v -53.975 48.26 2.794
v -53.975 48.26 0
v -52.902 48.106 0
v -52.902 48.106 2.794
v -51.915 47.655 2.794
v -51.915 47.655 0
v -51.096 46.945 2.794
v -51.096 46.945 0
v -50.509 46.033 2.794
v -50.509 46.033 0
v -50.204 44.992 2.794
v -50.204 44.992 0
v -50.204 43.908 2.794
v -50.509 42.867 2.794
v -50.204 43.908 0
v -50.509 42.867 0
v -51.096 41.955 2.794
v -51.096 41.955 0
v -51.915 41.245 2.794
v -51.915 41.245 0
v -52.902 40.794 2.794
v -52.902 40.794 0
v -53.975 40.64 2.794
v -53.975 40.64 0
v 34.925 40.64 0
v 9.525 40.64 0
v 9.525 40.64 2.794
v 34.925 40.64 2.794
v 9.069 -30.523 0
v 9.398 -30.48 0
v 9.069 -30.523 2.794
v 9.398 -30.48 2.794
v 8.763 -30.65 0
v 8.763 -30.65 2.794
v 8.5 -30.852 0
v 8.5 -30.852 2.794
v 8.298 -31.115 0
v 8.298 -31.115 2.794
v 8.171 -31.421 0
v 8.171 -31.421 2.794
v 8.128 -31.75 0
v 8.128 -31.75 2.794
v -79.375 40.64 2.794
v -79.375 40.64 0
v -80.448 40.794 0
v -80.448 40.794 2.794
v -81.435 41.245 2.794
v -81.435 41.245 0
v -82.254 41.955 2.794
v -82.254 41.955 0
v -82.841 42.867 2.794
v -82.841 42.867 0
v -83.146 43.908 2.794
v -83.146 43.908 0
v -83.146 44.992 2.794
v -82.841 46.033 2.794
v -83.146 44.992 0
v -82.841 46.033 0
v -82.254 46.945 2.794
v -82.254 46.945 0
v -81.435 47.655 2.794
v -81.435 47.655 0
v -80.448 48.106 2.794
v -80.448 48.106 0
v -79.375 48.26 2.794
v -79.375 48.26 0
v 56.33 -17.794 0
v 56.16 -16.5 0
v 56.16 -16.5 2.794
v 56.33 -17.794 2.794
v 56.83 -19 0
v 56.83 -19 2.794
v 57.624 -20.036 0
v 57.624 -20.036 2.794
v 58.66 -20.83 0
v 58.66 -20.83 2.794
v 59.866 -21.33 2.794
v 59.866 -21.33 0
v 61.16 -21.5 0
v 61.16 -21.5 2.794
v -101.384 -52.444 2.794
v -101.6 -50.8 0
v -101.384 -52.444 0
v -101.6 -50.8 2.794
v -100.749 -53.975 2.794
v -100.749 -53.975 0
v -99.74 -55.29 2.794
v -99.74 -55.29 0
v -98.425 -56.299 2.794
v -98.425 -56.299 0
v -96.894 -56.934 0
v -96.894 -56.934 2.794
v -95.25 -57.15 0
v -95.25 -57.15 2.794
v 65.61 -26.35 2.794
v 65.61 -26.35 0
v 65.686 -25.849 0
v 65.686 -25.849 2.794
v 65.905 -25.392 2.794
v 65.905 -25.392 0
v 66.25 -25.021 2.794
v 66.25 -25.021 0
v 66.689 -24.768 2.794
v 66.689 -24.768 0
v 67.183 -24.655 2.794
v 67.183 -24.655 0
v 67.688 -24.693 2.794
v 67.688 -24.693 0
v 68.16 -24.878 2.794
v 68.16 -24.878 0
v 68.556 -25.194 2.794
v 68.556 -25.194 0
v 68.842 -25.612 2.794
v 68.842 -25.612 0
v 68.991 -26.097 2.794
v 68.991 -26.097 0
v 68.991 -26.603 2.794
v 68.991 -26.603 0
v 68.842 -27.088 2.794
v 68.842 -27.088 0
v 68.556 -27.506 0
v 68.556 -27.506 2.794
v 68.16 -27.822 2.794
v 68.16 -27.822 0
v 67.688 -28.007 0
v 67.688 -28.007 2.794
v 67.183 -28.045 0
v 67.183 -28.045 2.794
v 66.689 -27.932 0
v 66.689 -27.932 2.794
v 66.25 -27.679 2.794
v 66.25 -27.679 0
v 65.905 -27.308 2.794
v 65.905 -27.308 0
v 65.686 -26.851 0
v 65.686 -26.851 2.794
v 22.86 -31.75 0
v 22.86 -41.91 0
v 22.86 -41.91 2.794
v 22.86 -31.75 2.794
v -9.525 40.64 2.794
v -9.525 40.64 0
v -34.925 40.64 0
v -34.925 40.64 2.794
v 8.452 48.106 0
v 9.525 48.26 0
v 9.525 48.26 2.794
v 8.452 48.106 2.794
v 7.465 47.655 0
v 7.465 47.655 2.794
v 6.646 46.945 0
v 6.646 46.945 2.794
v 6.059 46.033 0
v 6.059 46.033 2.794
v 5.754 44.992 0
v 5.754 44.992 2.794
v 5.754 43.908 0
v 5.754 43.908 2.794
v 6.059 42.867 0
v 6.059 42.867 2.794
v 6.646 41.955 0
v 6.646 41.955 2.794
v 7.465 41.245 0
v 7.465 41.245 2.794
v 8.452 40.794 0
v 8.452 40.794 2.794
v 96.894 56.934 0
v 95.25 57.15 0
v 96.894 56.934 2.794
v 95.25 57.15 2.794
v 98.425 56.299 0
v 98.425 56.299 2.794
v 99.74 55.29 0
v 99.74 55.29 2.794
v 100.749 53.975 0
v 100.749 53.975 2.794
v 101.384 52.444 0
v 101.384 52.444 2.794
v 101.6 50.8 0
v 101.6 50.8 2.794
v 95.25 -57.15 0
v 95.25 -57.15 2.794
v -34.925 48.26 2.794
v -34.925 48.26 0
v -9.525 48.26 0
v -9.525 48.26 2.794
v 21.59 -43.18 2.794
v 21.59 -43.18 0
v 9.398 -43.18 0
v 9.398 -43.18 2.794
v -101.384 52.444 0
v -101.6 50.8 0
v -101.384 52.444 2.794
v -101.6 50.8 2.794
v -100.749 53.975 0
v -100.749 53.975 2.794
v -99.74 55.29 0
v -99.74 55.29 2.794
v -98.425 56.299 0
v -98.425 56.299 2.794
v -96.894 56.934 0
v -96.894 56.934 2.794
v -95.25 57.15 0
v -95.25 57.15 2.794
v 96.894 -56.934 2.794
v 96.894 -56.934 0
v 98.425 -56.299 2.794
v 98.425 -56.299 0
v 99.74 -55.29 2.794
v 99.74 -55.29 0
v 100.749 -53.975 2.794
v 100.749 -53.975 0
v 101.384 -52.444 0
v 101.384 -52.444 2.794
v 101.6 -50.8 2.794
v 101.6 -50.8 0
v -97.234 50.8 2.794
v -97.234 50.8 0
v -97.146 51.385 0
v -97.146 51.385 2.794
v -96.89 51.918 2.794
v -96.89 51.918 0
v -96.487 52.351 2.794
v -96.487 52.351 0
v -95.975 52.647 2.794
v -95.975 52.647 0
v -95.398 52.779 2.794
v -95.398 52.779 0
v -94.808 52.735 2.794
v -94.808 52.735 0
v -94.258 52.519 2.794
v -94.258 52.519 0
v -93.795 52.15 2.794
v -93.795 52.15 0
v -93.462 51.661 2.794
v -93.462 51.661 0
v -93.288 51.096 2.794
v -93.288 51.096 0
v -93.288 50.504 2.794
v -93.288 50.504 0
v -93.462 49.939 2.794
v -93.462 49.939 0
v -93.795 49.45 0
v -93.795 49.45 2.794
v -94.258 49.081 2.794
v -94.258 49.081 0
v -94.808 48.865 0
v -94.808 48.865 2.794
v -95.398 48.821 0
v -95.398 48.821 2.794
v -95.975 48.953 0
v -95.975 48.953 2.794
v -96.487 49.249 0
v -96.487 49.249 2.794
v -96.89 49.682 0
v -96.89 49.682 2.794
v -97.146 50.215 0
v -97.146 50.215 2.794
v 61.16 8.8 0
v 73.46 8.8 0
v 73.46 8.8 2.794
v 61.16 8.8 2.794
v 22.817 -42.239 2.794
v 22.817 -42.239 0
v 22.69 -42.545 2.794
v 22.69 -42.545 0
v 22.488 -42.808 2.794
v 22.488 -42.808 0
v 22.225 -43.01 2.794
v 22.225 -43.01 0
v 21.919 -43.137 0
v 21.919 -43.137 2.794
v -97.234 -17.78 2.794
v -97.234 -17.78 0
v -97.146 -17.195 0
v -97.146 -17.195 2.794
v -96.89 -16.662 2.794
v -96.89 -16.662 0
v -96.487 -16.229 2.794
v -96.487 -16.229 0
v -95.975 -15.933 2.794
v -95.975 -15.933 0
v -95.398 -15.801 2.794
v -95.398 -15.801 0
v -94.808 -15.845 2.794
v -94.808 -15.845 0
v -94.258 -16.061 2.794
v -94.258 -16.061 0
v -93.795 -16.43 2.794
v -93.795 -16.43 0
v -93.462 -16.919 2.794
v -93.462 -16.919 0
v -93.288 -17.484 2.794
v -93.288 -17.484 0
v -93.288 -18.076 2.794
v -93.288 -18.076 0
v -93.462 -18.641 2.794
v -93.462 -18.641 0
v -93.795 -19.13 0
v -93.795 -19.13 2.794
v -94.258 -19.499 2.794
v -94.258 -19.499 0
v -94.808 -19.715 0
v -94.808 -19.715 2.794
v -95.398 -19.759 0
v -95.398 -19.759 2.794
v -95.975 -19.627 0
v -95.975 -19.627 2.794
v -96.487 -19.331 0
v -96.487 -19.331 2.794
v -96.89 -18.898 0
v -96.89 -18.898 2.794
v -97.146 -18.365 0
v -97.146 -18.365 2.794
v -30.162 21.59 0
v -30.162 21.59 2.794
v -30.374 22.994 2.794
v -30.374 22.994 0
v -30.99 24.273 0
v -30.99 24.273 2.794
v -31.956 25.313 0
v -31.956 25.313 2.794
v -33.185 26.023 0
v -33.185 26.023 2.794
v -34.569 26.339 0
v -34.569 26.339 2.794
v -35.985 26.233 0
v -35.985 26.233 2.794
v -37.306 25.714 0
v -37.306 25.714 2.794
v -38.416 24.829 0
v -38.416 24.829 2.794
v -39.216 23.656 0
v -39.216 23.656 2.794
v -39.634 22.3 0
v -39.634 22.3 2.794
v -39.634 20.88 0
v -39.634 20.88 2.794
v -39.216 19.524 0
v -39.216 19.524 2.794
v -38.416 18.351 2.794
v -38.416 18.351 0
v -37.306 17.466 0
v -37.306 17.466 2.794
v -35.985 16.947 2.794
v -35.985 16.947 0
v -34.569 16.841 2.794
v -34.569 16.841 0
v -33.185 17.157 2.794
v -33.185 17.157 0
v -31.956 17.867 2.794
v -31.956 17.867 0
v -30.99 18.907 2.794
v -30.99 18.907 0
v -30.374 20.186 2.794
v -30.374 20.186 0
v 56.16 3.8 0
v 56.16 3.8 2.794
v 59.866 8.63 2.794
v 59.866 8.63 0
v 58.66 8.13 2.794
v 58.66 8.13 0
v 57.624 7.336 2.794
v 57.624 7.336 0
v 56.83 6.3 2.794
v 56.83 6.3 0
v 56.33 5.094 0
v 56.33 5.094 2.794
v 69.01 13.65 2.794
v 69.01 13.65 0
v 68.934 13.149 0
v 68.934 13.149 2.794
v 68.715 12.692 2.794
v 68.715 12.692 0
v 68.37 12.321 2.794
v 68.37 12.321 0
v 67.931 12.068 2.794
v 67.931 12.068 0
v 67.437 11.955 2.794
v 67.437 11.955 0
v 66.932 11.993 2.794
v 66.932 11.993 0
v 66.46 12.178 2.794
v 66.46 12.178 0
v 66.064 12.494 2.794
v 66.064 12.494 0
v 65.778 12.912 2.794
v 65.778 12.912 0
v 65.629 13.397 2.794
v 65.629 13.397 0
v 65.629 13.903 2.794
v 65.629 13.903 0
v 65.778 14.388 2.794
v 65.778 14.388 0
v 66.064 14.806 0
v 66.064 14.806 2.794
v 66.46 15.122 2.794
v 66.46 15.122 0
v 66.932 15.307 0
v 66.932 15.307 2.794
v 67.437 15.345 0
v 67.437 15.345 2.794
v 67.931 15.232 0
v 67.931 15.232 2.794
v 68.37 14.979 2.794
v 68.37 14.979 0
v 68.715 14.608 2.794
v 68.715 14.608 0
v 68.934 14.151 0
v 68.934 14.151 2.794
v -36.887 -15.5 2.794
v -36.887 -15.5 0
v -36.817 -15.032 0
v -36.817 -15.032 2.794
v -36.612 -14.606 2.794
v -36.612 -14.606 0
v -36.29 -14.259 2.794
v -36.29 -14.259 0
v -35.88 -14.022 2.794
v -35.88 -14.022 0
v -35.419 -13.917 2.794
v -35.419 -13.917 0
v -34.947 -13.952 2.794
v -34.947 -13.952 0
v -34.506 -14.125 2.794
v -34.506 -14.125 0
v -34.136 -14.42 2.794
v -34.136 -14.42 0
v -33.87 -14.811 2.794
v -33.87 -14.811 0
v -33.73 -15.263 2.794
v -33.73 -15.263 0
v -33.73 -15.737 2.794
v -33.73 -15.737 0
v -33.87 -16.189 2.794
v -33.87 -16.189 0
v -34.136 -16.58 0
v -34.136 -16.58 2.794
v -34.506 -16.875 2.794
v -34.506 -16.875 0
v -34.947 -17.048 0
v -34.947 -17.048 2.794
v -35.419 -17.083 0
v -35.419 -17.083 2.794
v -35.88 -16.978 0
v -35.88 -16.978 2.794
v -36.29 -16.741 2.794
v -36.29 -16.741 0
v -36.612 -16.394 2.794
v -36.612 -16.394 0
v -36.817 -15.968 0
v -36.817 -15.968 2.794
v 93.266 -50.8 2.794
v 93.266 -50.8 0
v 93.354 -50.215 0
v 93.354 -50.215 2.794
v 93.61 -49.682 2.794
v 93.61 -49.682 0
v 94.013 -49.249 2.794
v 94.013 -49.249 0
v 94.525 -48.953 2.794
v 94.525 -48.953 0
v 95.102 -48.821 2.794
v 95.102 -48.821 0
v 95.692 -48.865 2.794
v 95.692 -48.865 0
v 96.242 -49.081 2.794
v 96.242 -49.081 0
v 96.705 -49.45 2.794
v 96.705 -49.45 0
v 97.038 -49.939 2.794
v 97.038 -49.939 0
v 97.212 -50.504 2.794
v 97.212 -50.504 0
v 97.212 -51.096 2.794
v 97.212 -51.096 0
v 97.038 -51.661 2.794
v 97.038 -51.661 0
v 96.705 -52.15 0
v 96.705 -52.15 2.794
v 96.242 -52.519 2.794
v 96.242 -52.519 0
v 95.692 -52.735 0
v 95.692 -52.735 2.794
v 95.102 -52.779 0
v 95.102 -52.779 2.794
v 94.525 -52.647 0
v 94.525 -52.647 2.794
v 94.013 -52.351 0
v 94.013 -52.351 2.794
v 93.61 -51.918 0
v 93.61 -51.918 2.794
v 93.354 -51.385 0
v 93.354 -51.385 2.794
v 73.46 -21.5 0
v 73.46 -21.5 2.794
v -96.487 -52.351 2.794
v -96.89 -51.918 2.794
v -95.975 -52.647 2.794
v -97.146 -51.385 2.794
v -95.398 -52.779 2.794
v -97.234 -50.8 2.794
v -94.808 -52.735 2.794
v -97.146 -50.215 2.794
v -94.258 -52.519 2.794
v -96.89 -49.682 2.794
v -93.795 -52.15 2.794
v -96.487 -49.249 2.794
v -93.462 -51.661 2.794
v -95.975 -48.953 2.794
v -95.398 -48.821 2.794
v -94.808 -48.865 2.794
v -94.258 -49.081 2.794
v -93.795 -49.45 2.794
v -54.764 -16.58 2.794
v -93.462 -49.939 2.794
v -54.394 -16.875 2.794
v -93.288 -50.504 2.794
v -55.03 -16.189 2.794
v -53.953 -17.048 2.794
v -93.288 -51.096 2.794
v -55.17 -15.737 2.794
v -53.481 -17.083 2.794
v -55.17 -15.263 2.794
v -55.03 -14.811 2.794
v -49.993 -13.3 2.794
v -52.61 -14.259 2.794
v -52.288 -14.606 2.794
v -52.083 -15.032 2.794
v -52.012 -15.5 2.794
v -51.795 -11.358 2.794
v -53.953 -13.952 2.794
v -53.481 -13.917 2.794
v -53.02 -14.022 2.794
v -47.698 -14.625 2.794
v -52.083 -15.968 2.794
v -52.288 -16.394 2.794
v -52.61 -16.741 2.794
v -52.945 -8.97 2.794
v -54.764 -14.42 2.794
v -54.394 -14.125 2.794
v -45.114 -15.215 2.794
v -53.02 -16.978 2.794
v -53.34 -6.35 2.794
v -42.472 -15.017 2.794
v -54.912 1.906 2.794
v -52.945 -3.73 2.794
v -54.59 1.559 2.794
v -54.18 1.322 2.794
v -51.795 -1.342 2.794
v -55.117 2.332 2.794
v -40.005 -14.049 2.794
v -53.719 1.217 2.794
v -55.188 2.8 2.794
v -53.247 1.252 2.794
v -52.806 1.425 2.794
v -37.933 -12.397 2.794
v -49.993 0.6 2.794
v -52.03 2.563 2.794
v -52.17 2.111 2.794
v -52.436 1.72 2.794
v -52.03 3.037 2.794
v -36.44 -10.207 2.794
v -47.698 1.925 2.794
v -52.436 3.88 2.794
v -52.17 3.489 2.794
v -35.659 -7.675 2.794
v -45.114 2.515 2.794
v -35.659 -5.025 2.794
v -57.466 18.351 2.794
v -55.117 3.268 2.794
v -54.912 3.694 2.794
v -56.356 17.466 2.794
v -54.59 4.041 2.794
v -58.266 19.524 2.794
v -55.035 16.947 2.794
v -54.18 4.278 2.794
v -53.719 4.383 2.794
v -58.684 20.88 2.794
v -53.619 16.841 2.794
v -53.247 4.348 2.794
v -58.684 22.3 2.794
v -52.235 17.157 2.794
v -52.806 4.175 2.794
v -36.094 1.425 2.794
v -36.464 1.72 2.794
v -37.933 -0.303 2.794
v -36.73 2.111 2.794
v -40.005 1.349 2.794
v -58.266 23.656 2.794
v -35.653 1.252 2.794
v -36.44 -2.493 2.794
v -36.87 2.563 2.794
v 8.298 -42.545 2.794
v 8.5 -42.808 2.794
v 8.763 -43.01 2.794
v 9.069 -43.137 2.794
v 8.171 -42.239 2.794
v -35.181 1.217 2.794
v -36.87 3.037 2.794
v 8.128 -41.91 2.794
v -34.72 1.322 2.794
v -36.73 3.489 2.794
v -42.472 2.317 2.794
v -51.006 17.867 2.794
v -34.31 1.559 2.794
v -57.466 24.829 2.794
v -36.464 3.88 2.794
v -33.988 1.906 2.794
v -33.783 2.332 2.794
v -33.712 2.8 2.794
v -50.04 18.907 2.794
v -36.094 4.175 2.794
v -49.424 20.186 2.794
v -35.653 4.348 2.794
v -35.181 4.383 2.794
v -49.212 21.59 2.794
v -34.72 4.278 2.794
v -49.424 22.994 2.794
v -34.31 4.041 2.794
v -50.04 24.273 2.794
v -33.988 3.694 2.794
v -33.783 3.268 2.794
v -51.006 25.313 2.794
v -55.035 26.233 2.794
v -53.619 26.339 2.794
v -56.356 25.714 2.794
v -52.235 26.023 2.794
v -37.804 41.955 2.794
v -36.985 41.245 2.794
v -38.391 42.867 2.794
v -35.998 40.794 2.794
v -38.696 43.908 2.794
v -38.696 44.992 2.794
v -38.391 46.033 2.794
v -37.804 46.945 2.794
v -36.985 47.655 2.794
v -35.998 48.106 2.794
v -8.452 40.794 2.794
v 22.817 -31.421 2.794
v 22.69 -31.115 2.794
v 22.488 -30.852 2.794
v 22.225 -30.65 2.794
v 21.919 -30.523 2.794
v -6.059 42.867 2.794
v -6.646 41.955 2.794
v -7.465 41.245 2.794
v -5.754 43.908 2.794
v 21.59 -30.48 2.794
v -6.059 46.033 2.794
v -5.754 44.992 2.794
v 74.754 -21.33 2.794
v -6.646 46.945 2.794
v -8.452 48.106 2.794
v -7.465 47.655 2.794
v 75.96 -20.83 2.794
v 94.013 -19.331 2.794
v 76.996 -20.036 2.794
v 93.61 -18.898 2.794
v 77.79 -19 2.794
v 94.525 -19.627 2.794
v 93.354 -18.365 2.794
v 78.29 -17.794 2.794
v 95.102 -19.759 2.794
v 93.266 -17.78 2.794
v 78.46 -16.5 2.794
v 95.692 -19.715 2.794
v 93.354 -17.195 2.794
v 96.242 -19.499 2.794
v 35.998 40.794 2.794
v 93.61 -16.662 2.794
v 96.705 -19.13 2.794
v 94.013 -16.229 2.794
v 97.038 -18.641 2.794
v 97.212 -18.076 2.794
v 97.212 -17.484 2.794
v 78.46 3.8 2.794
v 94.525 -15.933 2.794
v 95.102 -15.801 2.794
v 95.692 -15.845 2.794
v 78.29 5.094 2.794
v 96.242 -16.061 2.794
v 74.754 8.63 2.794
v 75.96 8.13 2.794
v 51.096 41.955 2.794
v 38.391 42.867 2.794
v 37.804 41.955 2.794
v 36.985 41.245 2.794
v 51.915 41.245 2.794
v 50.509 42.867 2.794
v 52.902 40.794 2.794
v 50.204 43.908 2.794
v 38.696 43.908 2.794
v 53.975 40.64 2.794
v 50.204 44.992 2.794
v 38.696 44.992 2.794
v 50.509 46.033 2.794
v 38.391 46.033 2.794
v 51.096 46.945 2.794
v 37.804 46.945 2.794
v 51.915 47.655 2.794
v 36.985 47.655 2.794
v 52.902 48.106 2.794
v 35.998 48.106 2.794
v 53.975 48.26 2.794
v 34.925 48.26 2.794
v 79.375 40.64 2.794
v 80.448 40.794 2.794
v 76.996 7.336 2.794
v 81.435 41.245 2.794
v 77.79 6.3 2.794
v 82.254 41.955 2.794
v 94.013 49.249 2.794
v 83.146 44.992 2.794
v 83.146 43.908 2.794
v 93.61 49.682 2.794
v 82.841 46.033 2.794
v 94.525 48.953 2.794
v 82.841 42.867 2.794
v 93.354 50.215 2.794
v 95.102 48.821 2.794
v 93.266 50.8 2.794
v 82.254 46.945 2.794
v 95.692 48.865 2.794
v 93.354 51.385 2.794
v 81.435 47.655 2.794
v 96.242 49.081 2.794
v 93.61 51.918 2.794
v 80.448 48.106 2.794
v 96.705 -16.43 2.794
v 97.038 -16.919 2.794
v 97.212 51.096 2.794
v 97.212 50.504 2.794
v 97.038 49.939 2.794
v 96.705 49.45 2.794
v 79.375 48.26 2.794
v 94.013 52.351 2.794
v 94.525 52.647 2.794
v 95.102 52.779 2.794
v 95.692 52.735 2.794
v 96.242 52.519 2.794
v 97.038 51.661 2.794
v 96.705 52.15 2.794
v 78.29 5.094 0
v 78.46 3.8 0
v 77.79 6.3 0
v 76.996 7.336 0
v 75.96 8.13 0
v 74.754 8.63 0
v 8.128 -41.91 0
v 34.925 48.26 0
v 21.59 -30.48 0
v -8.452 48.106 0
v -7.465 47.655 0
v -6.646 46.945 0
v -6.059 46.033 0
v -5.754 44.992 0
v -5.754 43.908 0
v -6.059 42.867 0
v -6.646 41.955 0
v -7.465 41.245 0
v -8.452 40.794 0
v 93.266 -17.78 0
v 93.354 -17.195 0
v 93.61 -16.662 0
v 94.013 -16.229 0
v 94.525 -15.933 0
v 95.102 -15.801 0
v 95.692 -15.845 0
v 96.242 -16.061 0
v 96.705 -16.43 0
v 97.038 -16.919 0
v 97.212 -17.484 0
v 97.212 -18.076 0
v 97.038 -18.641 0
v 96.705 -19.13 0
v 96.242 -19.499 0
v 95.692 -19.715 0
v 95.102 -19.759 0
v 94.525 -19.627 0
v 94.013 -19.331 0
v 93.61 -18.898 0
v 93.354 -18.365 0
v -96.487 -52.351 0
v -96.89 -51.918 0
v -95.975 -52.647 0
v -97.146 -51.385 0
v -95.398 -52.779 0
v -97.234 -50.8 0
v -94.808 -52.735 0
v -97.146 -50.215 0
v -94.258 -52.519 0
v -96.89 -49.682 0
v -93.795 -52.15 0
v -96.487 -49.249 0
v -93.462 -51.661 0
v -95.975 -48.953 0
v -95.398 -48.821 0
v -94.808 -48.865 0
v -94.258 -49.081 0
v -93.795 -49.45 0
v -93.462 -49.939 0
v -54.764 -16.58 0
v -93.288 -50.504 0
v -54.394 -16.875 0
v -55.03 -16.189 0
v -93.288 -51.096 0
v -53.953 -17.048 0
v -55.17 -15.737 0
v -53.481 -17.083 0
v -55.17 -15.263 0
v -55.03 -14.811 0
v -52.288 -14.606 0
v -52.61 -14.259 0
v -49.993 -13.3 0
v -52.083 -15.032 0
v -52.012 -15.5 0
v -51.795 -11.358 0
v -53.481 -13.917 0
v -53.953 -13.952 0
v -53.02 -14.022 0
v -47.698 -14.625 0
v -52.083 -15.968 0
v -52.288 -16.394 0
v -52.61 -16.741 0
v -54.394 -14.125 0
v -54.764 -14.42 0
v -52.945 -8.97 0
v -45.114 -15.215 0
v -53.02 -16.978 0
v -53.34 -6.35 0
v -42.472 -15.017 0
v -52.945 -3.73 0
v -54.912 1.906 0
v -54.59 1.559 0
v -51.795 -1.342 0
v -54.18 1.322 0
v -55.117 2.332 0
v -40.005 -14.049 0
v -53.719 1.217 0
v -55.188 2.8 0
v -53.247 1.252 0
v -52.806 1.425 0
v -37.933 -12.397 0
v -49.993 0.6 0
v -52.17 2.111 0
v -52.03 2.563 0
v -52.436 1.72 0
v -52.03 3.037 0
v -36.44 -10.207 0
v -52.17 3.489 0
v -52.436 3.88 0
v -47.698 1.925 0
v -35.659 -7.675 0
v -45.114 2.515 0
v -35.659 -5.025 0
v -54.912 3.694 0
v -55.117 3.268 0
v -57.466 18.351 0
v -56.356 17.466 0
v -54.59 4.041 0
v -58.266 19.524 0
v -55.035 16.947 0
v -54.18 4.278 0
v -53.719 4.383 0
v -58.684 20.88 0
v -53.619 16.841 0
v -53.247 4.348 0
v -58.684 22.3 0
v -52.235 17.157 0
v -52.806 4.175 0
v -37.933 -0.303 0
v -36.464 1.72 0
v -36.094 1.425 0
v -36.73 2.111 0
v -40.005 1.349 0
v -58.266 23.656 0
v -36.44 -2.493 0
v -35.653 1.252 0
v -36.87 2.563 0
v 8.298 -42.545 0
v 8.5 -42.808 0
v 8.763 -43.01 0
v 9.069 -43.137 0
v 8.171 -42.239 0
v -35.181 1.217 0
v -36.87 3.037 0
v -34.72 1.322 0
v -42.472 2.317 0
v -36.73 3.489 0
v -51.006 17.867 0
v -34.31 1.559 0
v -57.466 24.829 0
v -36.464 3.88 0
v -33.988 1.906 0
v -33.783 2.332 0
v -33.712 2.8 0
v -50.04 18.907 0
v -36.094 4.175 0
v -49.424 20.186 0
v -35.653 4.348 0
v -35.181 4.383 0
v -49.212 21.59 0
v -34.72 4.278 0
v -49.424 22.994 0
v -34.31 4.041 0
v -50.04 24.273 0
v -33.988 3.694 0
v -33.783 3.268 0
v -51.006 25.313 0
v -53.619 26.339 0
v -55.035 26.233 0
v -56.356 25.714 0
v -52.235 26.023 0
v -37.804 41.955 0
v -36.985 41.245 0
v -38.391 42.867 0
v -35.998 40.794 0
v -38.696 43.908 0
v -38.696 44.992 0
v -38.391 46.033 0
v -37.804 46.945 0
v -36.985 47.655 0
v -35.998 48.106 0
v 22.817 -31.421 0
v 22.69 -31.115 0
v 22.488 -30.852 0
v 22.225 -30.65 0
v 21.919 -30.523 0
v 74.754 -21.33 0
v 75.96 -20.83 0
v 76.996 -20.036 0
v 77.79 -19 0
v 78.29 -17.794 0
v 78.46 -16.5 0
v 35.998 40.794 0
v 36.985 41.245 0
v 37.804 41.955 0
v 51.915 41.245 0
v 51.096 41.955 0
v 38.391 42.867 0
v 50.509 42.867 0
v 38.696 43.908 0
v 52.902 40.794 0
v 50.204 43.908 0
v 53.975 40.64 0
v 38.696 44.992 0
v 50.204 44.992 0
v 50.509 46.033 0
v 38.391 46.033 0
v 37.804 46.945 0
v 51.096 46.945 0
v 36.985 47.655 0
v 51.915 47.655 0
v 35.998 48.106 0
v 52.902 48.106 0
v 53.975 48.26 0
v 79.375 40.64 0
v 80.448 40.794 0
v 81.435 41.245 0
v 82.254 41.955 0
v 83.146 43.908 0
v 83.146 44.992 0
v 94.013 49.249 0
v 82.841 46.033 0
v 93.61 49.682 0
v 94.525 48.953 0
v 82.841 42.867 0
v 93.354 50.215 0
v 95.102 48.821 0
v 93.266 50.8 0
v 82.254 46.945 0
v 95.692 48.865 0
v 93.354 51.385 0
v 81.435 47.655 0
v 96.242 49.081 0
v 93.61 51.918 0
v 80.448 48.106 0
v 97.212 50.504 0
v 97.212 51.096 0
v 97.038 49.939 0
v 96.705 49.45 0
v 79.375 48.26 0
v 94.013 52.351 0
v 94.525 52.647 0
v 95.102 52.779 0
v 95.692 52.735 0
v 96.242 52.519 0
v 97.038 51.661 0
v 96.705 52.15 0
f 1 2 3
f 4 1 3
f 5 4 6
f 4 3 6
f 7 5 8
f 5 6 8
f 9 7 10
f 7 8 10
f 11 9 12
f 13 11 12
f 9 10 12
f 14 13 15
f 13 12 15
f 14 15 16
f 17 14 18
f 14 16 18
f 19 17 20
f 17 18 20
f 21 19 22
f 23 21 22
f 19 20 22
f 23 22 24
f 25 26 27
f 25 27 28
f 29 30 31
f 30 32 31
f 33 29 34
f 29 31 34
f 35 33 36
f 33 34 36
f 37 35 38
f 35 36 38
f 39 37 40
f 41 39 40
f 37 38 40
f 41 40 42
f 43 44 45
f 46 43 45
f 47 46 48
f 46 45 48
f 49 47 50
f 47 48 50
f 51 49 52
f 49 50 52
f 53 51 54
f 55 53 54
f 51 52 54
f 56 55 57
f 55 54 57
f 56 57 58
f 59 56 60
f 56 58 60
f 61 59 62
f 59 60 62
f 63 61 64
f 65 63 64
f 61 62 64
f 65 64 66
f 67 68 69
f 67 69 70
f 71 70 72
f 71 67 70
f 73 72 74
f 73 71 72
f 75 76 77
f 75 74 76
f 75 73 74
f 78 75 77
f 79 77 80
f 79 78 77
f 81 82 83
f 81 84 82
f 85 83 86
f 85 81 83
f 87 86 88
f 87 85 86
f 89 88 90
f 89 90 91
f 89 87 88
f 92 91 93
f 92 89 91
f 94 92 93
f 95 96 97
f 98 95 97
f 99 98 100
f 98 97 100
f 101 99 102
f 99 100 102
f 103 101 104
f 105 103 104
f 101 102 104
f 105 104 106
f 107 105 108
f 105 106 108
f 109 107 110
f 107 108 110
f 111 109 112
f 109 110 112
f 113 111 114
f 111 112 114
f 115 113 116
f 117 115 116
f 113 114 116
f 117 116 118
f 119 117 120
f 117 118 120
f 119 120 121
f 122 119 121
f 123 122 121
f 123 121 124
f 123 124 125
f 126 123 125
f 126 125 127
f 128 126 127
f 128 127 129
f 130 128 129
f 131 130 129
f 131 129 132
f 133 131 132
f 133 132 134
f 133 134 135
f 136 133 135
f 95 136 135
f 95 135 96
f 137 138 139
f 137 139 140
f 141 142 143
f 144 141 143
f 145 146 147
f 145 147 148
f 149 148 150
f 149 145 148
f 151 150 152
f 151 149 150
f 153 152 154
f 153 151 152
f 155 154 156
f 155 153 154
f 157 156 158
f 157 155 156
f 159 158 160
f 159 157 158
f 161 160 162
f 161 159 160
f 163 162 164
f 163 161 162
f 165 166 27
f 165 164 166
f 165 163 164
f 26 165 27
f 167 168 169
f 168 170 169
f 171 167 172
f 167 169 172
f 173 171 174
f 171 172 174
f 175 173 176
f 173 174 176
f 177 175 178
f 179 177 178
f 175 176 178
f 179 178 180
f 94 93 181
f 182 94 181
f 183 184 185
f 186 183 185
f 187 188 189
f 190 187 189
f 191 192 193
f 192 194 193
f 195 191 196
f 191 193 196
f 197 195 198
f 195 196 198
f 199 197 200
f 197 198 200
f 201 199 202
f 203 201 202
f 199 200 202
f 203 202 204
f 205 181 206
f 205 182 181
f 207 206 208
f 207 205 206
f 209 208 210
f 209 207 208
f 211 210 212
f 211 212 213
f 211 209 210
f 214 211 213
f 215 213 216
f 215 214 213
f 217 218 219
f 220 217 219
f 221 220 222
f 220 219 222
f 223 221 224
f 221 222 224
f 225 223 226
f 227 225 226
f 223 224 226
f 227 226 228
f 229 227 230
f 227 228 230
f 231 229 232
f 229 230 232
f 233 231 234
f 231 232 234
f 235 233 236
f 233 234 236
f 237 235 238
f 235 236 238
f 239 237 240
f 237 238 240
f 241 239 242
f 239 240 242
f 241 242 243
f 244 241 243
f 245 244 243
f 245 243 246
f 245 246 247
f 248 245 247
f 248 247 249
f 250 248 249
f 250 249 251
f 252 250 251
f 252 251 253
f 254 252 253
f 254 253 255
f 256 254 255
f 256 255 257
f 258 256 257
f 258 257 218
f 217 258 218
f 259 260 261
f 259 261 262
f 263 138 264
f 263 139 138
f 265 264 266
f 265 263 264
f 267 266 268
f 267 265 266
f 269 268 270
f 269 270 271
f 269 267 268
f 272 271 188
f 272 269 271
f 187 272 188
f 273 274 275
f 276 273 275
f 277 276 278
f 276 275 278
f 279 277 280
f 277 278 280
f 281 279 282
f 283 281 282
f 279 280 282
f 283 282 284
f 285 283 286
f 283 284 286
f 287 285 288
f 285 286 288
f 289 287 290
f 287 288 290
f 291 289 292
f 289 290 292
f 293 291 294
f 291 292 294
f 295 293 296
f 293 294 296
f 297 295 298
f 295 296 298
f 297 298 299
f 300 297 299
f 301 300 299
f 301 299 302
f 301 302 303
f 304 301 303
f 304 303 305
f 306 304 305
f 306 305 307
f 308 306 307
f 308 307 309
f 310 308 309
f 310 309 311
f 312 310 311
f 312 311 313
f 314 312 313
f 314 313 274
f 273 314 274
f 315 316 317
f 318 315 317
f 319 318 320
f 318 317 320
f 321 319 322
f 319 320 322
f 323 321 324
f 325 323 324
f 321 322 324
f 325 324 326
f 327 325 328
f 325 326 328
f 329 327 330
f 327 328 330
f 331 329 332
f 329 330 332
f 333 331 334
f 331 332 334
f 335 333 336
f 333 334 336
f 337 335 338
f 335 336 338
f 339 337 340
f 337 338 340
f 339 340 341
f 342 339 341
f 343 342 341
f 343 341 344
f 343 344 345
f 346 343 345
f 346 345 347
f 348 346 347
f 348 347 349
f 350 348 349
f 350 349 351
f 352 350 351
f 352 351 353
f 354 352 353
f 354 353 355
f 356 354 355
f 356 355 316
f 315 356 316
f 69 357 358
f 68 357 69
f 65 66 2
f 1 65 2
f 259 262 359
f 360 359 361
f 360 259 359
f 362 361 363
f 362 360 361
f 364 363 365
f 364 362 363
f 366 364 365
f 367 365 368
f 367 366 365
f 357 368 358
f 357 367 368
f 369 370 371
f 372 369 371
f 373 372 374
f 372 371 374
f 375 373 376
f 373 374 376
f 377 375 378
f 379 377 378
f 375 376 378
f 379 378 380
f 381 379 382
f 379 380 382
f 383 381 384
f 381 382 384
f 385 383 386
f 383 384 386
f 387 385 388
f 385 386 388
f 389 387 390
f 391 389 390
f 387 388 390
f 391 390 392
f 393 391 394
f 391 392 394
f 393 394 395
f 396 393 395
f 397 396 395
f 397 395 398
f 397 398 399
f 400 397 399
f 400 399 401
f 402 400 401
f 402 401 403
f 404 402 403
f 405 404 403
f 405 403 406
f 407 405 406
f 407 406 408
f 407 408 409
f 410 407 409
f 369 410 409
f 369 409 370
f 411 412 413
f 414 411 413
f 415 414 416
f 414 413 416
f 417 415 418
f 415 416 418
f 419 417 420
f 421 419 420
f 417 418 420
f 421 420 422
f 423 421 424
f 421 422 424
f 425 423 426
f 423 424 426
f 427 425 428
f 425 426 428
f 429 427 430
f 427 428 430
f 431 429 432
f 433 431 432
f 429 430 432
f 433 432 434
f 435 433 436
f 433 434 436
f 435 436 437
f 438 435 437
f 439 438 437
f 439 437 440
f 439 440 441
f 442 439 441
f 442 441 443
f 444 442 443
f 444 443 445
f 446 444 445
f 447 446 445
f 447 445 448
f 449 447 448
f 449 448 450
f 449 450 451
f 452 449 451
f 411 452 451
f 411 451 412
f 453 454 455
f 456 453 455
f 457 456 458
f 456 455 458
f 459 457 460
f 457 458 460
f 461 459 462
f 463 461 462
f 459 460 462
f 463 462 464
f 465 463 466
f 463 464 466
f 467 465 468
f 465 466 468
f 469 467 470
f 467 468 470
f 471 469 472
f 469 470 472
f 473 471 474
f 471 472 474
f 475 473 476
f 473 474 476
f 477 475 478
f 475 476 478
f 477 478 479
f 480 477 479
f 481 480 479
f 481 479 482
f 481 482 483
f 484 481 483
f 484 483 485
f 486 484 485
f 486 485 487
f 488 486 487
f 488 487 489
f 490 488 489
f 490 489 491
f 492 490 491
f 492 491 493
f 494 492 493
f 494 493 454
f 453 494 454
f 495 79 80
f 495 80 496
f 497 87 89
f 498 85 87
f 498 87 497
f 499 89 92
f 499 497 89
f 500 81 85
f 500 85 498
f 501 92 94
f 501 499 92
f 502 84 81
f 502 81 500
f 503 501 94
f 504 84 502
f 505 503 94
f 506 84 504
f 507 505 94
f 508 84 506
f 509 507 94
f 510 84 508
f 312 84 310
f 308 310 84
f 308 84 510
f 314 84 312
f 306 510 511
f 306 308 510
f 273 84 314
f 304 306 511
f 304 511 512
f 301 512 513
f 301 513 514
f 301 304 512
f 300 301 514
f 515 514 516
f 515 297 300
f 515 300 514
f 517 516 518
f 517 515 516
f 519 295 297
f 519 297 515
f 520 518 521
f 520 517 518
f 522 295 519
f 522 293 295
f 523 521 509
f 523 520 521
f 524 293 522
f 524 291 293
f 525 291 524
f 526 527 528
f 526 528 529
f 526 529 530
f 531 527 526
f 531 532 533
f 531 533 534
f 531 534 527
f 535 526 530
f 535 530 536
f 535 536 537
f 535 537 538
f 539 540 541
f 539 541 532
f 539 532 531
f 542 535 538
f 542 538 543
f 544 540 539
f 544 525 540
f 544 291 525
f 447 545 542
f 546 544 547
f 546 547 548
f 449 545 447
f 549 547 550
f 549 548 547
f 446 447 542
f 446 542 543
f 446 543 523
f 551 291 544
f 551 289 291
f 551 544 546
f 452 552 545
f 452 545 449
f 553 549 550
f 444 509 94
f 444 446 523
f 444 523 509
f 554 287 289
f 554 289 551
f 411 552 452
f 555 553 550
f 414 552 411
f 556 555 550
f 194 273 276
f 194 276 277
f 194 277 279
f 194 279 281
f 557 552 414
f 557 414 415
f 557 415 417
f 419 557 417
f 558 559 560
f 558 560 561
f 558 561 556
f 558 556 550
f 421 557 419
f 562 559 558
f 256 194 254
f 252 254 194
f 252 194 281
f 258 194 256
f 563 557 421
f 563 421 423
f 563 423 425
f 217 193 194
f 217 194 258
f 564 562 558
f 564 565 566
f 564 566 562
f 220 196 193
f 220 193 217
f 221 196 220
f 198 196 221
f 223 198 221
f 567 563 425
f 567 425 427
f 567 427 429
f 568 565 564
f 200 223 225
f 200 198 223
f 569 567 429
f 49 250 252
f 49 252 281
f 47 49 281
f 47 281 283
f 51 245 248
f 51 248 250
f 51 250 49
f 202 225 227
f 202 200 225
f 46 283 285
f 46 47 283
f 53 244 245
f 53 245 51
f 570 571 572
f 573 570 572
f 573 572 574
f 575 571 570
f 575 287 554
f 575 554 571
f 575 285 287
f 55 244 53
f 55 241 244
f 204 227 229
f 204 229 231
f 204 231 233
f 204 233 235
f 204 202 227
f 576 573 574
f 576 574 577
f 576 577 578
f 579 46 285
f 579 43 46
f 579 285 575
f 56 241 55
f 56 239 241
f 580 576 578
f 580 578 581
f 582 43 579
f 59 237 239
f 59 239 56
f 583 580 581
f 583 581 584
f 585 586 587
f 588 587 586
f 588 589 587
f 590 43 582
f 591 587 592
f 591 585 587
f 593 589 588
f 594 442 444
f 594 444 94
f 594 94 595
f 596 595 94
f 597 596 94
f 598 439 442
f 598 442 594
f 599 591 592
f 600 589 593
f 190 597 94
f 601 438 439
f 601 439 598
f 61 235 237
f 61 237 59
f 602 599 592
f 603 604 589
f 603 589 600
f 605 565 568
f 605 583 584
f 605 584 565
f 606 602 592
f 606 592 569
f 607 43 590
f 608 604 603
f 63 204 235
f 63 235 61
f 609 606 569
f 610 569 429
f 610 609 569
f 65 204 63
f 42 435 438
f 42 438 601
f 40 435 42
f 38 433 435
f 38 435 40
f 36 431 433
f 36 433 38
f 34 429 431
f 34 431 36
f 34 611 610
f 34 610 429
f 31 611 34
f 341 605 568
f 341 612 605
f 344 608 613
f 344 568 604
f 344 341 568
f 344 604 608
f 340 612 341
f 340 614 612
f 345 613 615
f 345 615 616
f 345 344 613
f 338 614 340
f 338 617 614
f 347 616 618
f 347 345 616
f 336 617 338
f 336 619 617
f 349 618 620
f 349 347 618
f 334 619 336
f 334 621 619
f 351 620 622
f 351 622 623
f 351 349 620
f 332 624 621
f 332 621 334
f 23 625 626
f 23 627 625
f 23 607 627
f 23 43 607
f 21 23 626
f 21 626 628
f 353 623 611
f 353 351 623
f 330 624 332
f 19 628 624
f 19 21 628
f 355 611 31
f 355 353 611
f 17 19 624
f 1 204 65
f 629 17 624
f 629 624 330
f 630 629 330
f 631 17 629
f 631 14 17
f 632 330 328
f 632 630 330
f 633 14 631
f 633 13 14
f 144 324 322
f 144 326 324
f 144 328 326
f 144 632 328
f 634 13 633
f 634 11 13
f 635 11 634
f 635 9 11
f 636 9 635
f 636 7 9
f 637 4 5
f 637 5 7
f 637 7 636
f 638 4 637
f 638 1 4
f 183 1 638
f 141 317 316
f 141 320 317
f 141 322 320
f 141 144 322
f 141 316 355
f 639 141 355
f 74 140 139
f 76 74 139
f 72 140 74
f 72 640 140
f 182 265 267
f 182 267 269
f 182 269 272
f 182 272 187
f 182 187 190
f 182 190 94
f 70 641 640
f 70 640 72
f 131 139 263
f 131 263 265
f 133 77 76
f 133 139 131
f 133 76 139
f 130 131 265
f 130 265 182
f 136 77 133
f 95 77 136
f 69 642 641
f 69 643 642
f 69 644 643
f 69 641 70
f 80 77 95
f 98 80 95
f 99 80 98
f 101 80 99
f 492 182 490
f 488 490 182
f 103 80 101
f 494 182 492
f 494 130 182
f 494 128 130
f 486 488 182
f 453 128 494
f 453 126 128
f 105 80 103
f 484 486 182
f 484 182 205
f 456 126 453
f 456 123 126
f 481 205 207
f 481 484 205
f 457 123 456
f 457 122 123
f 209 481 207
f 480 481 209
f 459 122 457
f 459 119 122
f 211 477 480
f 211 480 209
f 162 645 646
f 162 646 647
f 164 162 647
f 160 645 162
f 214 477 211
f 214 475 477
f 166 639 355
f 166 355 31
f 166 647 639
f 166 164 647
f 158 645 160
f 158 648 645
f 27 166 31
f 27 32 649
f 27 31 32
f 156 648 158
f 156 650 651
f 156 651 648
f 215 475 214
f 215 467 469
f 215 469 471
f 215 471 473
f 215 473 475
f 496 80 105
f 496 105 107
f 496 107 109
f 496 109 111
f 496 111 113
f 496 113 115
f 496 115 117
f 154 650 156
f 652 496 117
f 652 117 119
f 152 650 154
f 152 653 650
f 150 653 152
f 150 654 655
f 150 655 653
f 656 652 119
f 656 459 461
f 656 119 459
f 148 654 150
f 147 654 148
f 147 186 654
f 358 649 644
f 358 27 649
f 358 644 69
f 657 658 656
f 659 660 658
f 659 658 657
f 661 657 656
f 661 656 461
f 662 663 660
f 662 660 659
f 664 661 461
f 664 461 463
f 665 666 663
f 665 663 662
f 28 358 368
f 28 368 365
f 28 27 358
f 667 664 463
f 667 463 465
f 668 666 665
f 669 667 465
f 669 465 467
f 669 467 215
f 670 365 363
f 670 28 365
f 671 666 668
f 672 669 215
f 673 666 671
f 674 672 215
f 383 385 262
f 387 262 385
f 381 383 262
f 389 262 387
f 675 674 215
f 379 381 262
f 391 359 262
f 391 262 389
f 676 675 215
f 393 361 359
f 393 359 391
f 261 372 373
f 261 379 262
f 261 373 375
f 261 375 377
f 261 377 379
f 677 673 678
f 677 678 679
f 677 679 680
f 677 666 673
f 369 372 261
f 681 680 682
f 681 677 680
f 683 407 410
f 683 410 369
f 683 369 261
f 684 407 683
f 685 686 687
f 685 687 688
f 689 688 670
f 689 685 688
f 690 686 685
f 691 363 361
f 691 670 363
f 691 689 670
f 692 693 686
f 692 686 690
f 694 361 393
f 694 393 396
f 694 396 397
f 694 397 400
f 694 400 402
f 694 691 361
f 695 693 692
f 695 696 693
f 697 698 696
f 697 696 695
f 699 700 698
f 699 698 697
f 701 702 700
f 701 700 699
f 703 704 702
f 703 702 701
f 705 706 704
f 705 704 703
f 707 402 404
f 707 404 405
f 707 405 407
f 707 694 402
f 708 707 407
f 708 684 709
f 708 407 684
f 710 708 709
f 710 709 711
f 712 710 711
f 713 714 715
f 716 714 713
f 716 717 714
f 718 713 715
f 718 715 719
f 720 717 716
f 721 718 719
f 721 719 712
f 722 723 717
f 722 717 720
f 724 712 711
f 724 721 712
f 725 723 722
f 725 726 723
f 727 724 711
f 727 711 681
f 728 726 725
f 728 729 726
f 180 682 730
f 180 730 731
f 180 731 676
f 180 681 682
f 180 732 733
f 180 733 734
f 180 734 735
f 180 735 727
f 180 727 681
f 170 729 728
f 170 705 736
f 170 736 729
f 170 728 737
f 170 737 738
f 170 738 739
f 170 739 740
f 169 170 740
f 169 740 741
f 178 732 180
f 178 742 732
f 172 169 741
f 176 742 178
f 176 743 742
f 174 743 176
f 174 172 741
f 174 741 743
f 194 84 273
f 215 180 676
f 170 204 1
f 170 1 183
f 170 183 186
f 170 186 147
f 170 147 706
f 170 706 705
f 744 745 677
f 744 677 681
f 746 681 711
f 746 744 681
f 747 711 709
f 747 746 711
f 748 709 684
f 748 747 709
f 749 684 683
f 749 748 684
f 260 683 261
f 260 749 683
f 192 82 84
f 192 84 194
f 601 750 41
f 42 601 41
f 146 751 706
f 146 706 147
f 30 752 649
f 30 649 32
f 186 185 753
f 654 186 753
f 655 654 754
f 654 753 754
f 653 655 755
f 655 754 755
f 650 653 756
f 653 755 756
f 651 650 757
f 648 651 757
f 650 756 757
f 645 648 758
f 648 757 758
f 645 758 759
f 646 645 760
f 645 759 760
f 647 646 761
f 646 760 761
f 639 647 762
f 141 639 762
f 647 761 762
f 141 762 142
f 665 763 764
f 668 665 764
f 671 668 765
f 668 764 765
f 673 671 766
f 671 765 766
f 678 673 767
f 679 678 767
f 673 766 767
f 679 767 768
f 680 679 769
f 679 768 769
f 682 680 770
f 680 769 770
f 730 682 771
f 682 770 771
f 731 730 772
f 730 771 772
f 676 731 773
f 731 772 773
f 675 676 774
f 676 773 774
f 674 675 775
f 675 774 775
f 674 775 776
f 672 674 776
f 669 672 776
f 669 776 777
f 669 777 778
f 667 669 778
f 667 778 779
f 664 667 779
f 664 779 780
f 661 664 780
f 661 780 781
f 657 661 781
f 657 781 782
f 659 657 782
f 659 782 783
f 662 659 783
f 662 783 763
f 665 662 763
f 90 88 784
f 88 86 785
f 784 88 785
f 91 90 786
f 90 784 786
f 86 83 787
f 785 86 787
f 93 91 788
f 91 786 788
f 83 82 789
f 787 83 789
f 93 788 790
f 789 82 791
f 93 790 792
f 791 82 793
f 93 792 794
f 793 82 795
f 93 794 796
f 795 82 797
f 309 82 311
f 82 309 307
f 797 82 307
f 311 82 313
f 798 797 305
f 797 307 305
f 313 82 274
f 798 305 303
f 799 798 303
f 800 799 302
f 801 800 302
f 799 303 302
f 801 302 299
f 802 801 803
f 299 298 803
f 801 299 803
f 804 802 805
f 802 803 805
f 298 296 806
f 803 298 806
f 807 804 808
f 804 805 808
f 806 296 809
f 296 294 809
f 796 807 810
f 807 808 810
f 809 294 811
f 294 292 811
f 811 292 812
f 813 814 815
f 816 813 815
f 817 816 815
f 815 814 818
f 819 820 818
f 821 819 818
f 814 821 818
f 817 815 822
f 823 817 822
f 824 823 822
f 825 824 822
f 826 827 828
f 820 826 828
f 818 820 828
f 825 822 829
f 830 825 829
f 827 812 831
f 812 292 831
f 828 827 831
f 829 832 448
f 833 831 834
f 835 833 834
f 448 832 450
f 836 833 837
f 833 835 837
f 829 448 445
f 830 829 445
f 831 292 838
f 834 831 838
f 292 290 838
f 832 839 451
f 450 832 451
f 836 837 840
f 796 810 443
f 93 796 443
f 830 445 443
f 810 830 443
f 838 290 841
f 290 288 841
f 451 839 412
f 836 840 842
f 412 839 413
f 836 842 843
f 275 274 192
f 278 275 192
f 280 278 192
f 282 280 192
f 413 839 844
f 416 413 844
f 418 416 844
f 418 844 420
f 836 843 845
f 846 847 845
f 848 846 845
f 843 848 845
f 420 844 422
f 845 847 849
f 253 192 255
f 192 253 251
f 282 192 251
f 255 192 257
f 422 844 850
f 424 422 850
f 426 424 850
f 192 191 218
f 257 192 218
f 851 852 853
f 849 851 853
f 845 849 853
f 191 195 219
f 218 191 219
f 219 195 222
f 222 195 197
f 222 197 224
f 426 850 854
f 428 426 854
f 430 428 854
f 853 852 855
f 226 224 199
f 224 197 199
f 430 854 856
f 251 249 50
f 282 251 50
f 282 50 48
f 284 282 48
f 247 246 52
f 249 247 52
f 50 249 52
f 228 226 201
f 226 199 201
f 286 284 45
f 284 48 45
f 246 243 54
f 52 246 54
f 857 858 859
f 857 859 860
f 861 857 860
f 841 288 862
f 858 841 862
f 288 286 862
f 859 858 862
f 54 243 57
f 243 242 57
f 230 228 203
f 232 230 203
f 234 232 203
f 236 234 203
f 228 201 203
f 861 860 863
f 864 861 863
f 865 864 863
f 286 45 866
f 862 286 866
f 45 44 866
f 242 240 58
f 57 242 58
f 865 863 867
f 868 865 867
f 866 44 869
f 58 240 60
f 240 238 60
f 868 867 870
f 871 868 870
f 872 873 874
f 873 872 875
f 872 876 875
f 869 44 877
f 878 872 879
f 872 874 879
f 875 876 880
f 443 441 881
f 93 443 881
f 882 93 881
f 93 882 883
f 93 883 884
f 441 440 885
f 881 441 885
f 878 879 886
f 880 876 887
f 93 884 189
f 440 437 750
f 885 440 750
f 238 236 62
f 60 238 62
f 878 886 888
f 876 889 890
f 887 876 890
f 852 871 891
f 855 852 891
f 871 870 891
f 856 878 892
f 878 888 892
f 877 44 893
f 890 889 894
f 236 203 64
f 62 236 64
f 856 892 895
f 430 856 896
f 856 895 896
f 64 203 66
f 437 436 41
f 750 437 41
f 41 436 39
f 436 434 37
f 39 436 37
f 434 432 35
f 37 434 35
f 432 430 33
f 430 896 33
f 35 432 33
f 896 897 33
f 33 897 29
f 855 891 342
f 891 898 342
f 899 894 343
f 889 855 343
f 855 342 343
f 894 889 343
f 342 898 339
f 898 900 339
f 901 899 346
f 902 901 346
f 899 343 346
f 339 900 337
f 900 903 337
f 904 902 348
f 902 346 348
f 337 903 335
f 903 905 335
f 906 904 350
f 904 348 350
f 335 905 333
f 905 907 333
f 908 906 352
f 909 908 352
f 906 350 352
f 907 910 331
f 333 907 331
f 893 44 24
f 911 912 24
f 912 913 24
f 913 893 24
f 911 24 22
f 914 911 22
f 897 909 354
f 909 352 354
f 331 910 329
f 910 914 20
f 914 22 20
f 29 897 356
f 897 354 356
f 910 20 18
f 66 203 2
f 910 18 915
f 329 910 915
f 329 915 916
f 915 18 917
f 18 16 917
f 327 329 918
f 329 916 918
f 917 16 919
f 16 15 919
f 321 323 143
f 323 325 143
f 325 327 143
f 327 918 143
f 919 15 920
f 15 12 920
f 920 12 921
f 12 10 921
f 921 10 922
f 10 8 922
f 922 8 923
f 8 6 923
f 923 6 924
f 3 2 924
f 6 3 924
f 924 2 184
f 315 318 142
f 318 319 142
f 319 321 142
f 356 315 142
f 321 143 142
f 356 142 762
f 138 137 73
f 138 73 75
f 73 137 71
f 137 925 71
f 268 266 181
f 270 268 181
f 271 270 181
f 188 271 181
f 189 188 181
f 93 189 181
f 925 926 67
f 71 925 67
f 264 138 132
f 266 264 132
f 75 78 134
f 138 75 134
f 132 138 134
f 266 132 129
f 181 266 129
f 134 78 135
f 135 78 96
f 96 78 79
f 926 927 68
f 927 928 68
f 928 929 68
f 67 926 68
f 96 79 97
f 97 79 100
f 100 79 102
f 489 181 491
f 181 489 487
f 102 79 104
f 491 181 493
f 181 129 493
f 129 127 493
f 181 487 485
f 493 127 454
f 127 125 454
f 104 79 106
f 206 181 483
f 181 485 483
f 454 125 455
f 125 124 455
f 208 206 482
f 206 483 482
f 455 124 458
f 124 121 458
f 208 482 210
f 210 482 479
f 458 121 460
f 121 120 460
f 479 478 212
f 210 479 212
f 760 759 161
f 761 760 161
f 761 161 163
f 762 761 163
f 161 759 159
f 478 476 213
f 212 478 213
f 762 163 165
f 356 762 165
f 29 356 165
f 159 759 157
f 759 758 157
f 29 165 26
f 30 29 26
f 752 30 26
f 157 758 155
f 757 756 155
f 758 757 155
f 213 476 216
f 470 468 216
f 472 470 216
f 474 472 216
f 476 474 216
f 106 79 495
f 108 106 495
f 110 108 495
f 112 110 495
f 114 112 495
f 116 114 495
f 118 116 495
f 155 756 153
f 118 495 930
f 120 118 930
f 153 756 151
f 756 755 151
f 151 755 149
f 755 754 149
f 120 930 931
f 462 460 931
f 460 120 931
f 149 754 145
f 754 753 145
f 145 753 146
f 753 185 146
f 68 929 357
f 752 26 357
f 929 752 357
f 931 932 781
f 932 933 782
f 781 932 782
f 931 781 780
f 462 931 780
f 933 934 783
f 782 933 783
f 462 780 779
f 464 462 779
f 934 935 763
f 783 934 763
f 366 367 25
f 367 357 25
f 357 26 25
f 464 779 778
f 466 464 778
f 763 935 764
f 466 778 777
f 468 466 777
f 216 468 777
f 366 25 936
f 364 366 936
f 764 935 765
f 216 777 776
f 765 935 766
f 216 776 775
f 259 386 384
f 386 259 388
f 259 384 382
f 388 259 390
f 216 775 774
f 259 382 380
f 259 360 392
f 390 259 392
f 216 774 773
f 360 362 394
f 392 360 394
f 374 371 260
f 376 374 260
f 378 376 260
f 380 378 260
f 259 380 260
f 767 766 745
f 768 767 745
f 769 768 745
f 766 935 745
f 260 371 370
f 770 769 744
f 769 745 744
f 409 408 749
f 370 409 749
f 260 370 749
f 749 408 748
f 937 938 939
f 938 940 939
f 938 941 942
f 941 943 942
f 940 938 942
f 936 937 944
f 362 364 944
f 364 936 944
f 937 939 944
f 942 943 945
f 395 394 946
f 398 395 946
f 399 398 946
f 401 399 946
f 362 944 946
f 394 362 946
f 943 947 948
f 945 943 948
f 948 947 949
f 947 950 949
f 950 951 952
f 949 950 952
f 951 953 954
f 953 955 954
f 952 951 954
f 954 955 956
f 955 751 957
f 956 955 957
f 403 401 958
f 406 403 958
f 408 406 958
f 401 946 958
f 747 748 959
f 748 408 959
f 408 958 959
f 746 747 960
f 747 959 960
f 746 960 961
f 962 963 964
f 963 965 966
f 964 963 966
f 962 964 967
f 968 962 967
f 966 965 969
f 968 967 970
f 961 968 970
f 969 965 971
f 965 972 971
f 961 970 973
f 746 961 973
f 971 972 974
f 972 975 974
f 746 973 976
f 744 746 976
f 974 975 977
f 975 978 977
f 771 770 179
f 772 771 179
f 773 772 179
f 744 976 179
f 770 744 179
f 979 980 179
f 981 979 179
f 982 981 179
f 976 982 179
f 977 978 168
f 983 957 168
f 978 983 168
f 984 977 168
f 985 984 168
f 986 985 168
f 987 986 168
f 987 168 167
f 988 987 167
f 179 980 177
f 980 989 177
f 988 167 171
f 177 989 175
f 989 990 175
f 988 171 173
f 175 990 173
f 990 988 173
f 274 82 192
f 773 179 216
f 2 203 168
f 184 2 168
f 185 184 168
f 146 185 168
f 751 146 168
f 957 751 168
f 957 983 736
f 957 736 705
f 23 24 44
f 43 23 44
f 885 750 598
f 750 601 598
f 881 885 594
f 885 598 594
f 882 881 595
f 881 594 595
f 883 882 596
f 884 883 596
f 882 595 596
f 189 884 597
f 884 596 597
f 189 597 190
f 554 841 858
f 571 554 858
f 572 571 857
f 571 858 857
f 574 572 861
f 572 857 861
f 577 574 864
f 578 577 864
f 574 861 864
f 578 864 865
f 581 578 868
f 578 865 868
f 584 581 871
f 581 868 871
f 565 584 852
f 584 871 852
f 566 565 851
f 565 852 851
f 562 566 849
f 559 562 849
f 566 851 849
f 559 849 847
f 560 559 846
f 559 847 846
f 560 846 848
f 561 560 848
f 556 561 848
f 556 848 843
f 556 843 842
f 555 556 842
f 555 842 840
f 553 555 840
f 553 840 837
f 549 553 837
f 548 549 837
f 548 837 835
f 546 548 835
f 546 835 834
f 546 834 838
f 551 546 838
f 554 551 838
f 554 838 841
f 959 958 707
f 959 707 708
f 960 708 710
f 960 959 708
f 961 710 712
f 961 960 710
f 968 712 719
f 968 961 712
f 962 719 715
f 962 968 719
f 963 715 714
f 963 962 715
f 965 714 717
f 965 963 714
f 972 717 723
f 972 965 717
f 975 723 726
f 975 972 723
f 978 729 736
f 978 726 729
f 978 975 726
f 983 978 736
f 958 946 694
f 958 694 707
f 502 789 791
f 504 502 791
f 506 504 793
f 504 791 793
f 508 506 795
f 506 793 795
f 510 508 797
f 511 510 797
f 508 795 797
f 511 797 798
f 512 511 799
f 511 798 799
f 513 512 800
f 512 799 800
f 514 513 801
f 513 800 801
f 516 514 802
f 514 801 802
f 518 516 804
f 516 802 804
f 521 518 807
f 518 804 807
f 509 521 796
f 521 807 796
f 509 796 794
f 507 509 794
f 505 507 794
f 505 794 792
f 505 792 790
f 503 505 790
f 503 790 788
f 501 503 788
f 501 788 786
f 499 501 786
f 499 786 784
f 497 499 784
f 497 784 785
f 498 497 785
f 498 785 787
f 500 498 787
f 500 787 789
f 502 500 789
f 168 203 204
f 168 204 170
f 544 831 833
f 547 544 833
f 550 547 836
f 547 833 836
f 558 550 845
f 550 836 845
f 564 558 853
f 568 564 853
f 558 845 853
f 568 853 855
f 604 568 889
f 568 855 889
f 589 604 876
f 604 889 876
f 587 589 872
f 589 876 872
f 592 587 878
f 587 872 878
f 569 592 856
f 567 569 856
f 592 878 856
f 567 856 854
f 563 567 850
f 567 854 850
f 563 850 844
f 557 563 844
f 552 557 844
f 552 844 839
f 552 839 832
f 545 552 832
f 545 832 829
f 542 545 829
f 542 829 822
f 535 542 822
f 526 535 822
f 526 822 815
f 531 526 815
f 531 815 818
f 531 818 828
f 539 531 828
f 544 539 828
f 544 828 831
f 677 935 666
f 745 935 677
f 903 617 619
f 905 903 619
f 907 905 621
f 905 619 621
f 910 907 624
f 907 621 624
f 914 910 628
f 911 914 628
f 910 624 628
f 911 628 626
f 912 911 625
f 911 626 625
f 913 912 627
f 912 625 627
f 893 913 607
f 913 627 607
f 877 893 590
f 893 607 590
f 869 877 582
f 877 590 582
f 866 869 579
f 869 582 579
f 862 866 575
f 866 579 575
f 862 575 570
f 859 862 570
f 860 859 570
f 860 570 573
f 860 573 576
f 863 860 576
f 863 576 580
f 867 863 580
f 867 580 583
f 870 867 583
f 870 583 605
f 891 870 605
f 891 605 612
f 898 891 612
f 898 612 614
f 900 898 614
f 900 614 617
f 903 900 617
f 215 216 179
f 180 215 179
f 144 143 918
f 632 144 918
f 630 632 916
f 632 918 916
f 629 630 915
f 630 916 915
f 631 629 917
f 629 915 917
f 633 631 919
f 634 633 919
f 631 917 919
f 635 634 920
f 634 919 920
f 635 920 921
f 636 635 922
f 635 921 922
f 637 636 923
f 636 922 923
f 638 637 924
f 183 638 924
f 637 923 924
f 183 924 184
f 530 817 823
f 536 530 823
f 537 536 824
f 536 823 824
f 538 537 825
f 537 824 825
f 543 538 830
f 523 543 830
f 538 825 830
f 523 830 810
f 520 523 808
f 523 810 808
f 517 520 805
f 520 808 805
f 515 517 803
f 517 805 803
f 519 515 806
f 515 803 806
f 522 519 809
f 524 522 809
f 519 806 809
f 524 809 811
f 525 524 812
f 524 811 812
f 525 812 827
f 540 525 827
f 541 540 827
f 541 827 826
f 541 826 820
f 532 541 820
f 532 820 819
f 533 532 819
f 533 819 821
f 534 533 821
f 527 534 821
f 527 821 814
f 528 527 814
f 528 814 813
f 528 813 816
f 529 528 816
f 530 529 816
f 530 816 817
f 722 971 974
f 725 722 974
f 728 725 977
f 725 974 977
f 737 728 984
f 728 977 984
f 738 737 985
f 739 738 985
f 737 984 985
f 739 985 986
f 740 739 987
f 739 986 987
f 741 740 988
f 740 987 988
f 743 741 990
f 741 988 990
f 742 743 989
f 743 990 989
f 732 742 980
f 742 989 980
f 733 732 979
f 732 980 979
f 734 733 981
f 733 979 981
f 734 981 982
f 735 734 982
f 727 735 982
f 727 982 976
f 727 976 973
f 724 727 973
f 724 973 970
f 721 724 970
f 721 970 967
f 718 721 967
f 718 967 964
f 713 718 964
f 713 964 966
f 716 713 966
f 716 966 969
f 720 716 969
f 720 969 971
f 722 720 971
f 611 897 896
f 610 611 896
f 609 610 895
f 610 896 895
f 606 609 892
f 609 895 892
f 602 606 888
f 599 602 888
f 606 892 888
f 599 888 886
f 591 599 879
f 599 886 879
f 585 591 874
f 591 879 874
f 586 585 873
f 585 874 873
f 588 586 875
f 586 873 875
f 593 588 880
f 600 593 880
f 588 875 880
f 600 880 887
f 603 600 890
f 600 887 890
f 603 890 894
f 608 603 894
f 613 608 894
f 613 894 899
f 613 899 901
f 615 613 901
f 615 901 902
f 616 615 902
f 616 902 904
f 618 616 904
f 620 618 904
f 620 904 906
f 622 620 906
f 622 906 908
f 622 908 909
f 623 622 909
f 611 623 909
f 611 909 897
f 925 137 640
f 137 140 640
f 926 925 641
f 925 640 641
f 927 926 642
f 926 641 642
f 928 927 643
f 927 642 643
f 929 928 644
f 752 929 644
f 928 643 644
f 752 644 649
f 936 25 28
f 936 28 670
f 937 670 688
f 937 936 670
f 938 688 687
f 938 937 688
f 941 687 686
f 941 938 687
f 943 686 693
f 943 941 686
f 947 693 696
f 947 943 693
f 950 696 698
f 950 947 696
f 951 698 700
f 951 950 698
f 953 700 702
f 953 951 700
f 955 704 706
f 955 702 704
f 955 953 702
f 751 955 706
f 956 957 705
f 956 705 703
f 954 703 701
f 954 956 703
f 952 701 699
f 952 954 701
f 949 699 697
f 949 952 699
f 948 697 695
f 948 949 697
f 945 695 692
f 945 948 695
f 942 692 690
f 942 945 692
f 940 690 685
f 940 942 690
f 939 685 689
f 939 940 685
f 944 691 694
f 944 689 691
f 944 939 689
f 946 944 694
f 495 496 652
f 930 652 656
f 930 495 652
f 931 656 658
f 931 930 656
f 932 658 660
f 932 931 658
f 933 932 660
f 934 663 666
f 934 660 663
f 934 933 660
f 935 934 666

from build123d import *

# Parameters (mm, degrees)
SKETCH1_W                       = 203.2
SKETCH1_H                       = 114.3
BOSS_EXTRUDE1_DEPTH             = 2.794
F_5_32_0_15625_DIAMETER_HOLE1_D = 3.96875
FILLET2_R                       = 6.35
SKETCH7_R                       = 8.89
SKETCH7_R_2                     = 1.5875
SKETCH7_W                       = 14.732
SKETCH7_H                       = 12.7
CUT_EXTRUDE1_DEPTH              = 117.603983362
FILLET3_R                       = 1.27
F_3_8_0_375_DIAMETER_HOLE1_D    = 9.525
SKETCH12_R                      = 1.7
CUT_EXTRUDE4_DEPTH              = 117.603983362
CUT_EXTRUDE5_DEPTH              = 117.603983362


with BuildPart() as part:
    # Sketch1 → Boss-Extrude1 (new body)
    with BuildSketch(Plane.XY):
        Rectangle(SKETCH1_W, SKETCH1_H)
    extrude(amount=BOSS_EXTRUDE1_DEPTH)

    # 5/32 (0.15625) Diameter Hole1 (through all)
    with Locations(Plane.XY.offset(2.794)):
        with Locations((95.25, -17.78), (-95.25, 50.8), (95.25, 50.8), (95.25, -50.8), (-95.25, -50.8), (-95.25, -17.78)):
            Hole(F_5_32_0_15625_DIAMETER_HOLE1_D / 2)

    # Fillet2
    fillet2_edges = [part.edges().sort_by_distance(p)[0] for p in [
        (101.6, -57.15, 1.397),
        (-101.6, -57.15, 1.397),
        (-101.6, 57.15, 1.397),
        (101.6, 57.15, 1.397),
    ]]
    fillet(fillet2_edges, radius=FILLET2_R)

    # Sketch7 → Cut-Extrude1 (cut, through all)
    with BuildSketch(Plane(origin=(0, 0, 0), x_dir=(-1, 0, 0), z_dir=(0, 0, -1))):
        with Locations((44.45, -6.35)):
            Circle(SKETCH7_R)
        with Locations((53.6, 2.8)):
            Circle(SKETCH7_R_2)
        with Locations(Location((35.3, 2.8, 0), (0, 0, 180))):
            Circle(SKETCH7_R_2)
        with Locations(Location((53.6, -15.5, 0), (0, 0, 180))):
            Circle(SKETCH7_R_2)
        with Locations((35.3, -15.5)):
            Circle(SKETCH7_R_2)
        with Locations((-15.494, -36.83)):
            Rectangle(SKETCH7_W, SKETCH7_H)
    extrude(amount=-CUT_EXTRUDE1_DEPTH, mode=Mode.SUBTRACT)

    # Fillet3
    fillet3_edges = [part.edges().sort_by_distance(p)[0] for p in [
        (22.86, -43.18, 1.397),
        (22.86, -30.48, 1.397),
        (8.128, -30.48, 1.397),
        (8.128, -43.18, 1.397),
    ]]
    fillet(fillet3_edges, radius=FILLET3_R)

    # 3/8 (0.375) Diameter Hole1 (through all)
    with Locations(Plane(origin=(0, 0, 0), x_dir=(-1, 0, 0), z_dir=(0, 0, -1))):
        with Locations((53.975, 21.59), (34.925, 21.59)):
            Hole(F_3_8_0_375_DIAMETER_HOLE1_D / 2)

    # Sketch12 → Cut-Extrude4 (cut, through all)
    with BuildSketch(Plane(origin=(0, 0, 0), x_dir=(-1, 0, 0), z_dir=(0, 0, -1))):
        with Locations((-67.31, -26.35)):
            Circle(SKETCH12_R)
        with Locations(Location((-67.31, 13.65, 0), (0, 0, 180))):
            Circle(SKETCH12_R)
        with BuildLine():
            Line((-73.46, 8.8), (-61.16, 8.8))
            ThreePointArc((-61.16, 8.8), (-57.624466094, 7.335533906), (-56.16, 3.8))
            Line((-56.16, 3.8), (-56.16, -16.5))
            ThreePointArc((-56.16, -16.5), (-57.624466094, -20.035533906), (-61.16, -21.5))
            Line((-61.16, -21.5), (-73.46, -21.5))
            ThreePointArc((-73.46, -21.5), (-76.995533906, -20.035533906), (-78.46, -16.5))
            Line((-78.46, -16.5), (-78.46, 3.8))
            ThreePointArc((-78.46, 3.8), (-76.995533906, 7.335533906), (-73.46, 8.8))
        make_face()
    extrude(amount=-CUT_EXTRUDE4_DEPTH, mode=Mode.SUBTRACT)

    # Sketch13 → Cut-Extrude5 (cut, through all)
    with BuildSketch(Plane(origin=(0, 0, 0), x_dir=(-1, 0, 0), z_dir=(0, 0, -1))):
        with BuildLine():
            Line((-79.375, 48.26), (-53.975, 48.26))
            ThreePointArc((-53.975, 48.26), (-50.165, 44.45), (-53.975, 40.64))
            Line((-53.975, 40.64), (-79.375, 40.64))
            ThreePointArc((-79.375, 40.64), (-83.185, 44.45), (-79.375, 48.26))
        make_face()
        with BuildLine():
            Line((79.375, 48.26), (53.975, 48.26))
            ThreePointArc((53.975, 48.26), (50.165, 44.45), (53.975, 40.64))
            Line((53.975, 40.64), (79.375, 40.64))
            ThreePointArc((79.375, 40.64), (83.185, 44.45), (79.375, 48.26))
        make_face()
        with BuildLine():
            Line((-34.925, 48.26), (-9.525, 48.26))
            ThreePointArc((-9.525, 48.26), (-5.715, 44.45), (-9.525, 40.64))
            Line((-9.525, 40.64), (-34.925, 40.64))
            ThreePointArc((-34.925, 40.64), (-38.735, 44.45), (-34.925, 48.26))
        make_face()
        with BuildLine():
            Line((34.925, 48.26), (9.525, 48.26))
            ThreePointArc((9.525, 48.26), (5.715, 44.45), (9.525, 40.64))
            Line((9.525, 40.64), (34.925, 40.64))
            ThreePointArc((34.925, 40.64), (38.735, 44.45), (34.925, 48.26))
        make_face()
    extrude(amount=-CUT_EXTRUDE5_DEPTH, mode=Mode.SUBTRACT)


solid = part.part
